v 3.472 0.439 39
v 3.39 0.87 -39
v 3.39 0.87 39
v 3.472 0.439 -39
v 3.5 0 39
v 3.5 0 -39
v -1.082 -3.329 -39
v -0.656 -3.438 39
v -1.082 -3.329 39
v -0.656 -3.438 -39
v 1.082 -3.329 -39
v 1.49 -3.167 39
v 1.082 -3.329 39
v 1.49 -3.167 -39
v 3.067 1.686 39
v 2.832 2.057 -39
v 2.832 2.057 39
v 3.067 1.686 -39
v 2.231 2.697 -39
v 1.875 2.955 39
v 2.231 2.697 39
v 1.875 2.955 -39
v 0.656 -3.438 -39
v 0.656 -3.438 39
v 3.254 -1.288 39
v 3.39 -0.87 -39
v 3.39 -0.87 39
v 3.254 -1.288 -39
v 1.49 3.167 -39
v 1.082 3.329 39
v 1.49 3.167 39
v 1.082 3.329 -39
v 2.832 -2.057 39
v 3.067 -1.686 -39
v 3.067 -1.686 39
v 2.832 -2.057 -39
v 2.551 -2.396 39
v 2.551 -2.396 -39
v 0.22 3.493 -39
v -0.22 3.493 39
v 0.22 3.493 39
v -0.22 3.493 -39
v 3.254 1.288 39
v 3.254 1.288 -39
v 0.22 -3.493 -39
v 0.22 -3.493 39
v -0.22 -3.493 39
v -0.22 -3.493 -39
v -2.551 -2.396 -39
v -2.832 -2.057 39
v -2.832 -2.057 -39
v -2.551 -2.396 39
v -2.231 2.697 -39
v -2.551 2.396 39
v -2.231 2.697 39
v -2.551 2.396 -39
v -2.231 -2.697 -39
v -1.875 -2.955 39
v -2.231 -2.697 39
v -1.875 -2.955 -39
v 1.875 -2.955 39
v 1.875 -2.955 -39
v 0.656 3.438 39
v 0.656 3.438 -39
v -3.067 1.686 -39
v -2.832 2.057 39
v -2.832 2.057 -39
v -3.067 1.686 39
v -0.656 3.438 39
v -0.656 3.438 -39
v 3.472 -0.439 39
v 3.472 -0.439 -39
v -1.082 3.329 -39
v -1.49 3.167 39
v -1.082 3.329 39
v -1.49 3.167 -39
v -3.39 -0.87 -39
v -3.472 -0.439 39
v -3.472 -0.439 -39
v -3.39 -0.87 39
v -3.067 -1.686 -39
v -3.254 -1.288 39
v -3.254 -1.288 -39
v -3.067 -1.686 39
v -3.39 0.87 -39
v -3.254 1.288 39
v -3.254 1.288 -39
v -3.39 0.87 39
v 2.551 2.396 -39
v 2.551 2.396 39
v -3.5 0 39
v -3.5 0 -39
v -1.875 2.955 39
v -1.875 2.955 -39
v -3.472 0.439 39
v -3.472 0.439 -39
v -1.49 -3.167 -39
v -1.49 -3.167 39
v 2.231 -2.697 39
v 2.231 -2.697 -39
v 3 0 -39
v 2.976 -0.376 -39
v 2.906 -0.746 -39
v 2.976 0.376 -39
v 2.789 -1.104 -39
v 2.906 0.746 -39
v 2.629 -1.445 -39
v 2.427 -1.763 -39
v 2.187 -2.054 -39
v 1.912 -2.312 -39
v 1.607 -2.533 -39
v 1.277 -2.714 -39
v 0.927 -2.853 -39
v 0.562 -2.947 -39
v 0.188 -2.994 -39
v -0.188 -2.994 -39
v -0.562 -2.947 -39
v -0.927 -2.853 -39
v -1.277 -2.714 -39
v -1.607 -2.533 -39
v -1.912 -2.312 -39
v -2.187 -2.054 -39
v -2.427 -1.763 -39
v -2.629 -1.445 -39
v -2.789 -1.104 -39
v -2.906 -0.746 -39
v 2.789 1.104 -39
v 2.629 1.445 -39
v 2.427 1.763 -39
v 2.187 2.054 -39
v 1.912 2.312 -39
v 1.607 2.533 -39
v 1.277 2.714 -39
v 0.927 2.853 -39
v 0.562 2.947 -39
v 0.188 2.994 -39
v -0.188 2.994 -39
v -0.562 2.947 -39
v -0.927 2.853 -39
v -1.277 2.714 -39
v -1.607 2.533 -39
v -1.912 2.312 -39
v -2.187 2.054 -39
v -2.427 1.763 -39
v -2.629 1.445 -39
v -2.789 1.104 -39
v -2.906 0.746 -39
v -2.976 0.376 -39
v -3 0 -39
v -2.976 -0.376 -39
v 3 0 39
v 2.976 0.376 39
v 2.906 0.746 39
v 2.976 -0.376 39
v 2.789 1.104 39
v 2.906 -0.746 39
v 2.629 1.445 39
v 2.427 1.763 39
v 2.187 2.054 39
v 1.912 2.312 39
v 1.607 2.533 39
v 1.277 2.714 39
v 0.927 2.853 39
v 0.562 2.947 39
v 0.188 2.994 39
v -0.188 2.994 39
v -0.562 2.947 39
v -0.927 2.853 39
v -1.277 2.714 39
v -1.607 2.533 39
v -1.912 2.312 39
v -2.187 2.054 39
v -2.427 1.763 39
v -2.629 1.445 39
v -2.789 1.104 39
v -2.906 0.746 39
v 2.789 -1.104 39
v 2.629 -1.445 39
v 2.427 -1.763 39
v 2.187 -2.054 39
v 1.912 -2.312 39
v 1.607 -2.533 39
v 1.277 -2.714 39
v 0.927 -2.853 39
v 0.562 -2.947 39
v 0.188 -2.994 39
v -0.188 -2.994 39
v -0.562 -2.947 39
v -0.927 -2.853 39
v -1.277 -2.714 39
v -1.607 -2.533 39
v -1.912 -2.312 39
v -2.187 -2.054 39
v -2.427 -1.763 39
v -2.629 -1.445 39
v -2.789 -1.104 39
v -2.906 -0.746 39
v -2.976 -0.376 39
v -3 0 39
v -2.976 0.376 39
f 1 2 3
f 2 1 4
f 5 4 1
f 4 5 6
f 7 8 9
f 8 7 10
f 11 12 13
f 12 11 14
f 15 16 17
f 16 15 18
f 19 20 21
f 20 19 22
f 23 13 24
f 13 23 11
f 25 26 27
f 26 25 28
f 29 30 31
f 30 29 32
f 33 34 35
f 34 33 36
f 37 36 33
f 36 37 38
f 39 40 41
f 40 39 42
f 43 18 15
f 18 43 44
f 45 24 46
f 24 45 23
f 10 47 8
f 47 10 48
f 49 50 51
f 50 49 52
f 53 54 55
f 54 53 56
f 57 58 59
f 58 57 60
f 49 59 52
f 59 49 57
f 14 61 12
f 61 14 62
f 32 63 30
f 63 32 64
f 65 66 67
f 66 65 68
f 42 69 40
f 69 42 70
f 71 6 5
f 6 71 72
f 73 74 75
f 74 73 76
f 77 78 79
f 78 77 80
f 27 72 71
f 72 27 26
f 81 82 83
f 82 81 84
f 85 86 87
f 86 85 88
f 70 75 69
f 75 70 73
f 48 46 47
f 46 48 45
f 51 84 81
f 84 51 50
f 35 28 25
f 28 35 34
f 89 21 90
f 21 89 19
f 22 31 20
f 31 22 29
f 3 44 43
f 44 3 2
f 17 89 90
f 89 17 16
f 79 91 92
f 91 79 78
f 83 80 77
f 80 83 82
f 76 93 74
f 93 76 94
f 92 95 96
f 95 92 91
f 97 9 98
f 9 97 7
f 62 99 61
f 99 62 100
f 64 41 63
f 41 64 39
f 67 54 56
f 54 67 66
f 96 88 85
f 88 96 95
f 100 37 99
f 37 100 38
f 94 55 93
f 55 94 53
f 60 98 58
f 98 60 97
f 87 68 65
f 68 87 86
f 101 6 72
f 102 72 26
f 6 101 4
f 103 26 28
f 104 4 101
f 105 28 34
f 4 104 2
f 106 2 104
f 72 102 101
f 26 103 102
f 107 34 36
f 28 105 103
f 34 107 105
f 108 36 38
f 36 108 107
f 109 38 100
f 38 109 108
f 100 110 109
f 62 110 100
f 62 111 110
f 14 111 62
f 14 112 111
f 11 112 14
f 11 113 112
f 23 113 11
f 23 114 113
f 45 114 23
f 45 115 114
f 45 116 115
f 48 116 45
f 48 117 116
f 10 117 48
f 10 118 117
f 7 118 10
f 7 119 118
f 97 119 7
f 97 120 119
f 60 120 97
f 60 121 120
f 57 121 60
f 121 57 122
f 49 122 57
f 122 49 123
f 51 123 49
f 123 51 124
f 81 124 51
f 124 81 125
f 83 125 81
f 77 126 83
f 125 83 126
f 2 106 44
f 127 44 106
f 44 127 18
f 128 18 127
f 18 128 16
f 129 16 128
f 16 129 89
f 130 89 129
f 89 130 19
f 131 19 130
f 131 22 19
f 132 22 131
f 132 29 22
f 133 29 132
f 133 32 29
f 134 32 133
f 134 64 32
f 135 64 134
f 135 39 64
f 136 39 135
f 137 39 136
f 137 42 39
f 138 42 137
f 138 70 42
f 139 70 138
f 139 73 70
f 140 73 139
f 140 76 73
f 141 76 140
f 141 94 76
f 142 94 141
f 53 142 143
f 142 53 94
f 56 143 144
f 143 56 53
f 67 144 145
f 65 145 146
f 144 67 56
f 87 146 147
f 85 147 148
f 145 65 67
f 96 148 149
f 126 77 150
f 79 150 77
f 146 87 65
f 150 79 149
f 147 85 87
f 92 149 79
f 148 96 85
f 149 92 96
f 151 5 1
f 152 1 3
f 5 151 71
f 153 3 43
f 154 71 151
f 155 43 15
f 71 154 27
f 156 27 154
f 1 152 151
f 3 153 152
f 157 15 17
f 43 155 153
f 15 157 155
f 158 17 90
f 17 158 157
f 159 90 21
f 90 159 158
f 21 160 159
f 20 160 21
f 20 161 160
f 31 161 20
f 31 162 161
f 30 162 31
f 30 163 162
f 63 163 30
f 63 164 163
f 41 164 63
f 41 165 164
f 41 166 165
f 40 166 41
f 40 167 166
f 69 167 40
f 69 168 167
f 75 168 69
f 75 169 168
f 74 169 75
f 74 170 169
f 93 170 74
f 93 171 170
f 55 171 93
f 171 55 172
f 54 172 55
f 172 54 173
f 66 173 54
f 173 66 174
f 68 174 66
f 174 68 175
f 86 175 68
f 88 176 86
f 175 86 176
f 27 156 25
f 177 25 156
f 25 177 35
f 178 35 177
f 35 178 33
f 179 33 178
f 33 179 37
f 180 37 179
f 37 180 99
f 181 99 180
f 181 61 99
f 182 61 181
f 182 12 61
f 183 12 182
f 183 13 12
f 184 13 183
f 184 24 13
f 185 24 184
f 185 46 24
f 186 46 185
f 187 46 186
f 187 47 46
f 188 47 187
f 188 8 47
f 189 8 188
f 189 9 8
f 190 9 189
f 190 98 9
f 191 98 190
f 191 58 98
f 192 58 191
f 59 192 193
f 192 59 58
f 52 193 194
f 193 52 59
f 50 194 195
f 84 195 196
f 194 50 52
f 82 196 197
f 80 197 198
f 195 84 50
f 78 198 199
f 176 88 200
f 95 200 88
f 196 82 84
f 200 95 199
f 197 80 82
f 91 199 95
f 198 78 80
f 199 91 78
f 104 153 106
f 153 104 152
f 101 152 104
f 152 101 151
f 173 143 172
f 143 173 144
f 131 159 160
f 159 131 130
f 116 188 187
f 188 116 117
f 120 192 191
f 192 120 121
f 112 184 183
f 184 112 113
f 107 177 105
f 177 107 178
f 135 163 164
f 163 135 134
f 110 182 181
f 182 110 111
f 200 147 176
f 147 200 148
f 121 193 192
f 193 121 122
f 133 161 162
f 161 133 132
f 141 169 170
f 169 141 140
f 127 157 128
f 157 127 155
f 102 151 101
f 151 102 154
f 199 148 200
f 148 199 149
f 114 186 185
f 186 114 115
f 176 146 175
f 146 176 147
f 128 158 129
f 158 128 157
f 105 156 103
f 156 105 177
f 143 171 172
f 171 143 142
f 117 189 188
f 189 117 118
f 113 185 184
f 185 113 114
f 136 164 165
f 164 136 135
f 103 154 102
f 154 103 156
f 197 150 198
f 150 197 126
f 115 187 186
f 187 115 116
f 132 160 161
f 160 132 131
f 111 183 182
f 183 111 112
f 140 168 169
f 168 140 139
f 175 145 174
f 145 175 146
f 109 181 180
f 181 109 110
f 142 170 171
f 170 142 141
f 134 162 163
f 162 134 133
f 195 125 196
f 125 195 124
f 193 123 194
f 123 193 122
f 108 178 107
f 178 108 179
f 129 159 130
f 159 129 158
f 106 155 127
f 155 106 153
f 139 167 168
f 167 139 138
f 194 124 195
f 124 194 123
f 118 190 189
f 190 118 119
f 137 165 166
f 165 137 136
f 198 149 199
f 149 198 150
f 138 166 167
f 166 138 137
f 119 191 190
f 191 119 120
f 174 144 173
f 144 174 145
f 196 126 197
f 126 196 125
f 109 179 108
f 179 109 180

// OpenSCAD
$fn = 50;


difference() {
	union() {
		translate(v = [0, 0, -39.0000000000]) {
			cylinder(h = 78, r = 3.5000000000);
		}
	}
	union() {
		translate(v = [0, 0, -100.0000000000]) {
			cylinder(h = 200, r = 3.0000000000);
		}
	}
}
